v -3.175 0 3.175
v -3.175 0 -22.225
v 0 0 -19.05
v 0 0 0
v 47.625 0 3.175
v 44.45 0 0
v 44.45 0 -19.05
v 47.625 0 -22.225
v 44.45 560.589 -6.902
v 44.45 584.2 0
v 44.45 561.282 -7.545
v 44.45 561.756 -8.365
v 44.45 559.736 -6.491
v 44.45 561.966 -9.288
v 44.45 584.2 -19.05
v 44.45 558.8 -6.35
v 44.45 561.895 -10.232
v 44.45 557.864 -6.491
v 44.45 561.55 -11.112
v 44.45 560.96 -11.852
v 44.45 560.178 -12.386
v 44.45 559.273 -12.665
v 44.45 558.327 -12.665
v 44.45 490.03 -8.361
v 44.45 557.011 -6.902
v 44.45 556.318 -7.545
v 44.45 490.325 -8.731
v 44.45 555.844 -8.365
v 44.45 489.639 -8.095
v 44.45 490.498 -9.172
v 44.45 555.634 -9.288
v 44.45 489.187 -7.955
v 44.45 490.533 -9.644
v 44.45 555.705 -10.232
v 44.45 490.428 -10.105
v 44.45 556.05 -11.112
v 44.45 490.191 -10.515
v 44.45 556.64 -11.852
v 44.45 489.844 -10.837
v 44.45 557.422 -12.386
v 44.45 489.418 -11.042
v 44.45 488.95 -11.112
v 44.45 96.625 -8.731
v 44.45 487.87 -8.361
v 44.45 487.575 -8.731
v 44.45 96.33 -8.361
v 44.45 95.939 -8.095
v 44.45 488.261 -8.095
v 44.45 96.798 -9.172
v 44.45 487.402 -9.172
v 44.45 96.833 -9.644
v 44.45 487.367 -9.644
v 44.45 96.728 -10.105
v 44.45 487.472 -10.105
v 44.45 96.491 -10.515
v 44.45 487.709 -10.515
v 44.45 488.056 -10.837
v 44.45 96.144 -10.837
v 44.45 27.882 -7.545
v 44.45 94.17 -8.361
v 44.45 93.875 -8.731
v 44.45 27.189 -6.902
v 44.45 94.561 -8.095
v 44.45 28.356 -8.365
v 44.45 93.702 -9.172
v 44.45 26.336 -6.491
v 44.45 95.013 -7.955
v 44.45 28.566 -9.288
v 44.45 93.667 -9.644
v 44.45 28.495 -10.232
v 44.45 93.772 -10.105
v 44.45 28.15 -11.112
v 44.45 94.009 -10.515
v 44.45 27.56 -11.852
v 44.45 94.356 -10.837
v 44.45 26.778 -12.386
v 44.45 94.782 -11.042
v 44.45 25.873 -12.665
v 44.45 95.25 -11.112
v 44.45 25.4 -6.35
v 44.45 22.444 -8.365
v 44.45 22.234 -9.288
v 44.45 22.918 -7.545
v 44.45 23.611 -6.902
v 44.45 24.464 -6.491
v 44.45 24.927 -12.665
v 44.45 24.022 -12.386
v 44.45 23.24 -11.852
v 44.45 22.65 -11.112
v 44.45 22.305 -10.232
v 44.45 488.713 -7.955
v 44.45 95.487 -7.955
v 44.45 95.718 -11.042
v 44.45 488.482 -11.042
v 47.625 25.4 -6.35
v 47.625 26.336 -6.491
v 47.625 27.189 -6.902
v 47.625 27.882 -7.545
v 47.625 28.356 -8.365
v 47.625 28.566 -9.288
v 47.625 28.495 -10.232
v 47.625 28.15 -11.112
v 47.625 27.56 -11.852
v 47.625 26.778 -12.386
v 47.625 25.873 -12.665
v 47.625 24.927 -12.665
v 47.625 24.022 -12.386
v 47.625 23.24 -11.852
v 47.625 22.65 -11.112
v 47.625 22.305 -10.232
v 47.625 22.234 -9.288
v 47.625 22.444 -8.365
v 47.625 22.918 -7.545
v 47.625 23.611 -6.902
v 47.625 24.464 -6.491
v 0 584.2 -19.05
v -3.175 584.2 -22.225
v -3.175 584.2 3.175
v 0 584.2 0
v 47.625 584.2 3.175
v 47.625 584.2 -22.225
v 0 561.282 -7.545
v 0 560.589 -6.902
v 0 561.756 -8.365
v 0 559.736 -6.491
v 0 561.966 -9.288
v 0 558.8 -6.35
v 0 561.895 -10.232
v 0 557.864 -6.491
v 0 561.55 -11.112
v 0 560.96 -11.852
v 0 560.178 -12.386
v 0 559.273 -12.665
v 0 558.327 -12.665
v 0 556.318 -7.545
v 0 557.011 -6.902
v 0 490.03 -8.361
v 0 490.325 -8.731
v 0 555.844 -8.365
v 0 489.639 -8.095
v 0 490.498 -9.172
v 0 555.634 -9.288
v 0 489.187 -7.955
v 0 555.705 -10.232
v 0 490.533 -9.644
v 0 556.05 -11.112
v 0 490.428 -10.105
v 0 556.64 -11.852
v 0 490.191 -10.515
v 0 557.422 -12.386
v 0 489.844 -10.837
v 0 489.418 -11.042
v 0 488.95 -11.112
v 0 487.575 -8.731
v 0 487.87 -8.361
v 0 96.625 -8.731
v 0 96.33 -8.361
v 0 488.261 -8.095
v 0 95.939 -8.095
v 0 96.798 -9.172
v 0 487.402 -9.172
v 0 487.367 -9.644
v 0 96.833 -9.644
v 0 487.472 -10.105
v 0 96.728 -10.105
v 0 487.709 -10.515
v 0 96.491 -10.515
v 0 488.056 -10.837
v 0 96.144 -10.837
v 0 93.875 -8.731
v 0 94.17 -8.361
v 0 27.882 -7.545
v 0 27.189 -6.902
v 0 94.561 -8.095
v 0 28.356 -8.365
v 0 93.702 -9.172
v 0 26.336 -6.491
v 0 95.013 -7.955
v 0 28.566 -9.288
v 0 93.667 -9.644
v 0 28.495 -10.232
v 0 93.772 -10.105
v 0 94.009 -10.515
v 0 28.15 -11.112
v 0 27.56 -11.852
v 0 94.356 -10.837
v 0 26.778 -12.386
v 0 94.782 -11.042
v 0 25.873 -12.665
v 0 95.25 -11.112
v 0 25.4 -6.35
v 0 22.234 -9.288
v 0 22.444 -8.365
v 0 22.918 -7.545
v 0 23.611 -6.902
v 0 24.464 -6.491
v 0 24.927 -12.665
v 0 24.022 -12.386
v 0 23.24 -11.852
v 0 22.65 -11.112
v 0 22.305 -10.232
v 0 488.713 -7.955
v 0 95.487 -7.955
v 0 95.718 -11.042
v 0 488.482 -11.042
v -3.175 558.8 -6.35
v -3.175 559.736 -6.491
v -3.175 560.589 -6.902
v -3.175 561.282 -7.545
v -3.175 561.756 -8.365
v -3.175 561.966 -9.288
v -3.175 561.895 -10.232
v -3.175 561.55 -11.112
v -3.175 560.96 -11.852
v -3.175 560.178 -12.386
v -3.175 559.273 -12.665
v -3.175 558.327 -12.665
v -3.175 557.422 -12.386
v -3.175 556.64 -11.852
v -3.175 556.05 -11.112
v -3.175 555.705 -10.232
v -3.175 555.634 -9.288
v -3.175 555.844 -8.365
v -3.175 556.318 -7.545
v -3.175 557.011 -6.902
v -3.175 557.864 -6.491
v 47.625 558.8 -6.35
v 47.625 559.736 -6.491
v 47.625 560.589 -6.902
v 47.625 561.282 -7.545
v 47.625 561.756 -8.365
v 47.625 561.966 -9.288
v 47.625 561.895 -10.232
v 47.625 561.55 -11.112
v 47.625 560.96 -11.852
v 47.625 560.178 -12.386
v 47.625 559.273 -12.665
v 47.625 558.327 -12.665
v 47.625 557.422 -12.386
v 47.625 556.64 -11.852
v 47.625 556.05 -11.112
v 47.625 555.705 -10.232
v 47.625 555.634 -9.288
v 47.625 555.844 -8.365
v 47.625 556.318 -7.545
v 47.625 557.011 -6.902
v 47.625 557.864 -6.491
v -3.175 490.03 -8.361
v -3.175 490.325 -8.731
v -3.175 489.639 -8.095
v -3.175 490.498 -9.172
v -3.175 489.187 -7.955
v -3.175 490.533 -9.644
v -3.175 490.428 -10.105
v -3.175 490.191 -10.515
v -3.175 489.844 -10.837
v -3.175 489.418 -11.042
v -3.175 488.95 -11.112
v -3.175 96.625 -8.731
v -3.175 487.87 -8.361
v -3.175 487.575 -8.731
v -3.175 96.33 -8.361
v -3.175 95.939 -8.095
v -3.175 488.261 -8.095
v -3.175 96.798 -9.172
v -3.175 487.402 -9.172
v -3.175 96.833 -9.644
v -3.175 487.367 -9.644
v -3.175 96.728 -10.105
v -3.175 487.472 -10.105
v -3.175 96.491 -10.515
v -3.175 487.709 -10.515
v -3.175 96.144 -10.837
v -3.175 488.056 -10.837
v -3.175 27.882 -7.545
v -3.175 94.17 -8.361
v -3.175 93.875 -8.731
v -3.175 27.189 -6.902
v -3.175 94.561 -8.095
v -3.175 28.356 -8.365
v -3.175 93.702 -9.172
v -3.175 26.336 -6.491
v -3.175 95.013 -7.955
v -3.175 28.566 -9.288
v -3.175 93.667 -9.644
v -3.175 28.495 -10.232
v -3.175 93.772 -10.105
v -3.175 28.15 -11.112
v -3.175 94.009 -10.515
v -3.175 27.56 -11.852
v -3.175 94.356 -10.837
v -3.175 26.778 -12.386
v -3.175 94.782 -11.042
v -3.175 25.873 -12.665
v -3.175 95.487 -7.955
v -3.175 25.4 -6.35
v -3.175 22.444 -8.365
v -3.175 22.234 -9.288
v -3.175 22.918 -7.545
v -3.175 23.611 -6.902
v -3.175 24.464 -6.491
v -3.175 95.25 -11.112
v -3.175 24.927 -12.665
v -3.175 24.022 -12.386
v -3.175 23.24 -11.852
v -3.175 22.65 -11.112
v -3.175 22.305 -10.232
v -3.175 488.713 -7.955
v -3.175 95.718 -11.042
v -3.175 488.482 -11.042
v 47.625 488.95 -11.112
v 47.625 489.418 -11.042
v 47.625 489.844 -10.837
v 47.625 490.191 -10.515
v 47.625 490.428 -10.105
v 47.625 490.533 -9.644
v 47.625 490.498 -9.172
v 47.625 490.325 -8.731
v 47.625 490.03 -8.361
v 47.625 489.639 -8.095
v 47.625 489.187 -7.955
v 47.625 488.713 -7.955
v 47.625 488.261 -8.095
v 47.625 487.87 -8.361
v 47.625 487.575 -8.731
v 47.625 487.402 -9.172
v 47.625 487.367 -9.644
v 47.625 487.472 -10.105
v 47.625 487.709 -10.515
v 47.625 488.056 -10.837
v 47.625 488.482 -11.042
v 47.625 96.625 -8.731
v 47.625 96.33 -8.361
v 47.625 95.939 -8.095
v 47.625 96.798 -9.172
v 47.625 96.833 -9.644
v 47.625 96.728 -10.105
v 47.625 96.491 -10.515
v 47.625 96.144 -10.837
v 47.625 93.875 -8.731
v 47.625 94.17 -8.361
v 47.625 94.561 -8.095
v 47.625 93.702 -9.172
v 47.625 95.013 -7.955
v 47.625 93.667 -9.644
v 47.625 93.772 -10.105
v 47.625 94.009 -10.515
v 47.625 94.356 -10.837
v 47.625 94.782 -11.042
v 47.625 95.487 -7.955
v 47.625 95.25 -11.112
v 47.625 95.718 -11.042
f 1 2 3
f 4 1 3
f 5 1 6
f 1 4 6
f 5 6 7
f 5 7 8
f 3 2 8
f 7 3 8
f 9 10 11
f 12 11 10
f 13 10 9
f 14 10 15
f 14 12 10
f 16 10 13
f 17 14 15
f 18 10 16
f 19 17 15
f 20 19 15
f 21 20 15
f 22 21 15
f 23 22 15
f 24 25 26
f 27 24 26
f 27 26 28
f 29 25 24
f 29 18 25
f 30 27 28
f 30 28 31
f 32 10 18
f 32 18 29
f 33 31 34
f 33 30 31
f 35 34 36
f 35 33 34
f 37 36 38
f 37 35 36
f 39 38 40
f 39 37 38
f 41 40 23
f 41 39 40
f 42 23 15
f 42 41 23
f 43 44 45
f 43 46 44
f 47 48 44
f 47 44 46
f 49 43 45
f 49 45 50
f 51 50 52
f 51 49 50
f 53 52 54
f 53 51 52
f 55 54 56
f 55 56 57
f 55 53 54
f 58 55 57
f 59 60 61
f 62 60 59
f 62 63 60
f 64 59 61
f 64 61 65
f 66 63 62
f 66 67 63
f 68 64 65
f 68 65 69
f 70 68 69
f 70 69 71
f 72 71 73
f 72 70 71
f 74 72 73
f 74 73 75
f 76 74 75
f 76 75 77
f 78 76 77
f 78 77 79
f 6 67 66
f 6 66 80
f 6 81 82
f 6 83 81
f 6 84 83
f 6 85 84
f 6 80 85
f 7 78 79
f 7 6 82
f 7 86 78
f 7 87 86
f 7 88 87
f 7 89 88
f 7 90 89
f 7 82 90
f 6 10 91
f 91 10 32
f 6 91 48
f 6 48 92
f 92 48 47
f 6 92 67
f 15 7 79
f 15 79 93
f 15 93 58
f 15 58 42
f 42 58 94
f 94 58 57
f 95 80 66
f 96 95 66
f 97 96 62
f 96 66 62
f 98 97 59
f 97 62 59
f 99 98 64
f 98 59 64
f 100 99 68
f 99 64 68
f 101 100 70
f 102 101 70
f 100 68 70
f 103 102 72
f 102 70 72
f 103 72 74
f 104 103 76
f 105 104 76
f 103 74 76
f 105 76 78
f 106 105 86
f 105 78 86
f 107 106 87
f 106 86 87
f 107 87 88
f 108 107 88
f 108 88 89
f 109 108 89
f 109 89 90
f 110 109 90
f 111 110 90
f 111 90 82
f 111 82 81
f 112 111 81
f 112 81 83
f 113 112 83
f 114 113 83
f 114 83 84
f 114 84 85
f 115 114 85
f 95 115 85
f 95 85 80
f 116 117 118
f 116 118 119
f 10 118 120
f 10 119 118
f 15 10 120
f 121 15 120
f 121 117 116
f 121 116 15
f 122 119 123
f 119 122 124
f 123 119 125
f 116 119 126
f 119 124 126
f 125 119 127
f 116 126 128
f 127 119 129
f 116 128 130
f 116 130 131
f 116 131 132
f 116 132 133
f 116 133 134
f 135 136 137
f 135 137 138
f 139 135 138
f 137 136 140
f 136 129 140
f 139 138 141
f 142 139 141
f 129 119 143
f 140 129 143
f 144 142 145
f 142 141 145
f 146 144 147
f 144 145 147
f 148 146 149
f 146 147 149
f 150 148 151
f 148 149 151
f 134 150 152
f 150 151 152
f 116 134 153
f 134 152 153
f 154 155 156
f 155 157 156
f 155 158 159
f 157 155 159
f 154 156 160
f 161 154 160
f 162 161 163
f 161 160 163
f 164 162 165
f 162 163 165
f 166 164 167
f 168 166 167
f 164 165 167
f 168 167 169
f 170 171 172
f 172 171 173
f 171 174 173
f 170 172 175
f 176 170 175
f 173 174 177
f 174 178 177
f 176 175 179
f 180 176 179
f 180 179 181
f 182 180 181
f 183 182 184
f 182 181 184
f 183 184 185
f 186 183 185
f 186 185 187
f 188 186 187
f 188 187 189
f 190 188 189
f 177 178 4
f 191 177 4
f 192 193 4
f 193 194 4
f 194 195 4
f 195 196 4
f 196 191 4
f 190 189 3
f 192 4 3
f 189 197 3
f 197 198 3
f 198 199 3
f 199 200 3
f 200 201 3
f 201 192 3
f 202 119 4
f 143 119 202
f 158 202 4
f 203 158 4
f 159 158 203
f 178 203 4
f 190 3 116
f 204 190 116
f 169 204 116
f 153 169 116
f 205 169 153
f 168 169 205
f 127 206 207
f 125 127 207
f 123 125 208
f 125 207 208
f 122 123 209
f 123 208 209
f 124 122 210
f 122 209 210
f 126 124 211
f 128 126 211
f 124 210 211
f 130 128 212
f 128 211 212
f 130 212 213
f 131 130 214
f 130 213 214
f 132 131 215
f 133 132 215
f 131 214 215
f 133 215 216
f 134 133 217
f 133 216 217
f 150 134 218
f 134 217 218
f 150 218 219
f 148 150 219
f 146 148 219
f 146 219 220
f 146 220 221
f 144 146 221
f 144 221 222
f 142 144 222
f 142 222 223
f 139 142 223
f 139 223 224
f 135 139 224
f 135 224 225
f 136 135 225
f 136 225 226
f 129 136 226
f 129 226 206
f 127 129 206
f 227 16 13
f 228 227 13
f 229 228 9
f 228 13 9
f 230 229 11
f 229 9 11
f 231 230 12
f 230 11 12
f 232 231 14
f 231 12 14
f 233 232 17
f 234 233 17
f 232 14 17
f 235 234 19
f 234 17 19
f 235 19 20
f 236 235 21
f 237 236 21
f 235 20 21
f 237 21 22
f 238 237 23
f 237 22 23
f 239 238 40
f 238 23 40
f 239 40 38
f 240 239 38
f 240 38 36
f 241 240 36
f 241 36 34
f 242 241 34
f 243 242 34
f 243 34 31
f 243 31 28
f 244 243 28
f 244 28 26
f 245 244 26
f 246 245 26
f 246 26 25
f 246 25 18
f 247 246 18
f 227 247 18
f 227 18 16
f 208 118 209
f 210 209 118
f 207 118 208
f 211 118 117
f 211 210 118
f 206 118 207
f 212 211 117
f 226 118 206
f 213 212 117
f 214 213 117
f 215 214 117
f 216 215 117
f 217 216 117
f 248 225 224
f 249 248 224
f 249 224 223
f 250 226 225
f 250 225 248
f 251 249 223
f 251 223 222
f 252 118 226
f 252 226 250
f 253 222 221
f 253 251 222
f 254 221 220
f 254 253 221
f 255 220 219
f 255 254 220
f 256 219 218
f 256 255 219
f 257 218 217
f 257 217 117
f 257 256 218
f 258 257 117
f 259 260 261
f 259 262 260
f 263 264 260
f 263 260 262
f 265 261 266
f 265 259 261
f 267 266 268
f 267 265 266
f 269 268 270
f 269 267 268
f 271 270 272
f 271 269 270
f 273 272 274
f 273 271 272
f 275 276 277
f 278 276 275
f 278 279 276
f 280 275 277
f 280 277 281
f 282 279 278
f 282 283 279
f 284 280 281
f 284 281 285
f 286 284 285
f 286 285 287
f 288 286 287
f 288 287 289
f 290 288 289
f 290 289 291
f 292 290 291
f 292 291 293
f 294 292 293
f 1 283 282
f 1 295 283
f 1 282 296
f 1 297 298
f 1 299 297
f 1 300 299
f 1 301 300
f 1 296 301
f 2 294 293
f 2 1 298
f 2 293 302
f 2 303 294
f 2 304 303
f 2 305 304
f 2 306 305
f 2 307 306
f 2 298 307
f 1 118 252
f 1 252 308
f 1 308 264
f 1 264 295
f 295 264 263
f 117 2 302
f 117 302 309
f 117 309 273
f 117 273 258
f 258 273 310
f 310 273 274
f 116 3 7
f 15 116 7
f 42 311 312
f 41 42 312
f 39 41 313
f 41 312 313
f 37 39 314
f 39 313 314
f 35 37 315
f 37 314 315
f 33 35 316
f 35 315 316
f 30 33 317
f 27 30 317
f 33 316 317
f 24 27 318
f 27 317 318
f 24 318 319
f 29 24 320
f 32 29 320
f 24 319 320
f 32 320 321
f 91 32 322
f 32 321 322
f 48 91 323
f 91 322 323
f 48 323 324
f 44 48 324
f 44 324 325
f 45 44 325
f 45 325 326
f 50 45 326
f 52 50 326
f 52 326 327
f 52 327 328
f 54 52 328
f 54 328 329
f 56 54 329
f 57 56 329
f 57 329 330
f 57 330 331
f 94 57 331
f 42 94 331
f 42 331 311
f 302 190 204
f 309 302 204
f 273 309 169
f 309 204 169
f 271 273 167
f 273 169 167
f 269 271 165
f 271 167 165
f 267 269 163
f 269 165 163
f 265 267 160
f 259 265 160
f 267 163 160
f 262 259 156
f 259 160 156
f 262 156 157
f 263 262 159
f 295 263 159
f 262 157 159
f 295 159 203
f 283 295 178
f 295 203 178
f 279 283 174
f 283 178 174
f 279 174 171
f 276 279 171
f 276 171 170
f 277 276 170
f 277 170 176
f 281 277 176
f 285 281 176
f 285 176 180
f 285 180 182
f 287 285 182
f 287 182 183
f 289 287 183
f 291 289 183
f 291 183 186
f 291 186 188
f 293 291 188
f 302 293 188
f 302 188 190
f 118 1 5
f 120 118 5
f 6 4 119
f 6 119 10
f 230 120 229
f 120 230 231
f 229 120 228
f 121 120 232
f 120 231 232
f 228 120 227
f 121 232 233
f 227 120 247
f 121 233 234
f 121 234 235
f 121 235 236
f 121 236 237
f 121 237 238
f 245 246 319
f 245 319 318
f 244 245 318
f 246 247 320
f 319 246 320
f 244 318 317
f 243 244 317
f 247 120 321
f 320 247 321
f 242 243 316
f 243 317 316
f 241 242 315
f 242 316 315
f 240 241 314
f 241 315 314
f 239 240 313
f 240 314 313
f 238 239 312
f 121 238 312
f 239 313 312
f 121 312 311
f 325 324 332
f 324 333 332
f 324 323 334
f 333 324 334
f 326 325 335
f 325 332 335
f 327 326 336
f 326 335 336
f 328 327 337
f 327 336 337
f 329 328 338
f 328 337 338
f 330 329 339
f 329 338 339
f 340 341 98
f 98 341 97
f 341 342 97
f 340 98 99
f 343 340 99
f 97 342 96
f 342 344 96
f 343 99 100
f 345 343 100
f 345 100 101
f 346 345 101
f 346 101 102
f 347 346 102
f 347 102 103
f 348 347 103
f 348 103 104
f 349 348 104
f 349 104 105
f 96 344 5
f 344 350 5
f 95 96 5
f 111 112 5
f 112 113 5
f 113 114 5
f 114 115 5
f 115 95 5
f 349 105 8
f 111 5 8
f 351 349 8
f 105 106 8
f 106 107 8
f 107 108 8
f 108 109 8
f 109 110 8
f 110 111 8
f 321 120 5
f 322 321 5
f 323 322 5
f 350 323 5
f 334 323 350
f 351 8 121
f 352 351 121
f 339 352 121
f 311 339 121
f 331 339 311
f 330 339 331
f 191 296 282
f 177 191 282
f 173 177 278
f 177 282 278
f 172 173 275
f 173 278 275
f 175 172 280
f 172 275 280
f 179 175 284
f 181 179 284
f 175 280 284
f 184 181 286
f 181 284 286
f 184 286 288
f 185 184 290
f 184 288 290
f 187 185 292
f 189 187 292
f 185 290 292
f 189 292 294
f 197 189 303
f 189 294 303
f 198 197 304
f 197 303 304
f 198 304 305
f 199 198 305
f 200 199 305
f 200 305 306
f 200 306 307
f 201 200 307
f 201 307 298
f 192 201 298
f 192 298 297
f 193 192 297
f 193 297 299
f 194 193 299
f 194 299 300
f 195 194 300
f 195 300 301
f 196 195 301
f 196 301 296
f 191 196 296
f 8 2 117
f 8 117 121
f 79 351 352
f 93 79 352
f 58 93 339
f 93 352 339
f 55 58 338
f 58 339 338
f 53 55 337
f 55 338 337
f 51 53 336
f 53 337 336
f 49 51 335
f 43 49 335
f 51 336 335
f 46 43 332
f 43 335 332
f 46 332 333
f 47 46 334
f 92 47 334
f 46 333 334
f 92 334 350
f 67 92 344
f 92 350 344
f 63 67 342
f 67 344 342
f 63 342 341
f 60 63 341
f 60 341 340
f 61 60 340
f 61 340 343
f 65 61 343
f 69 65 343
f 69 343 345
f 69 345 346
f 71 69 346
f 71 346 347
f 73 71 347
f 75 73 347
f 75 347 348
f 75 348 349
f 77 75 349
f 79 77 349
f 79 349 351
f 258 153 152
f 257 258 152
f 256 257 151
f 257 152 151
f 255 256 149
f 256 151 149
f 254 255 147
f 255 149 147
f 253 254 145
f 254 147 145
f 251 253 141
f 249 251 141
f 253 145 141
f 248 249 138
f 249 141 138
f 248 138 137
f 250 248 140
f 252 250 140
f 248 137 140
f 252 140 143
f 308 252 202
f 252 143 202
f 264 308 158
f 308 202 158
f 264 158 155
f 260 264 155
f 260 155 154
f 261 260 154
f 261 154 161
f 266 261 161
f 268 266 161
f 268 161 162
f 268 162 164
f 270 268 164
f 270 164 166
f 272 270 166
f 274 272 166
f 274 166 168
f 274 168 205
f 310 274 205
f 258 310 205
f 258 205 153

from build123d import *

# Parameters (mm, degrees)
SKETCH1_W           = 50.8
SKETCH1_H           = 25.4
SKETCH1_W_2         = 44.45
SKETCH1_H_2         = 19.05
BOSS_EXTRUDE1_DEPTH = 584.2
SKETCH2_R           = 1.5875
CUT_EXTRUDE1_DEPTH  = 587.825553828
SKETCH3_R           = 3.175
CUT_EXTRUDE2_DEPTH  = 587.825553828


with BuildPart() as part:
    # Sketch1 → Boss-Extrude1 (new body)
    with BuildSketch(Plane(origin=(0, 0, 0), x_dir=(1, 0, 0), z_dir=(0, 1, 0))):
        with Locations((22.225, 9.525)):
            Rectangle(SKETCH1_W, SKETCH1_H)
        with Locations((22.225, 9.525)):
            Rectangle(SKETCH1_W_2, SKETCH1_H_2, mode=Mode.SUBTRACT)
    extrude(amount=BOSS_EXTRUDE1_DEPTH)

    # Sketch2 → Cut-Extrude1 (cut, through all)
    with BuildSketch(Plane(origin=(47.625, 0, 0), x_dir=(0, 0, -1), z_dir=(1, 0, 0))):
        with Locations((9.525, 95.25)):
            Circle(SKETCH2_R)
        with Locations((9.525, 488.95)):
            Circle(SKETCH2_R)
    extrude(amount=-CUT_EXTRUDE1_DEPTH, mode=Mode.SUBTRACT)

    # Sketch3 → Cut-Extrude2 (cut, through all)
    with BuildSketch(Plane.ZY.offset(3.175)):
        with Locations((-9.525, 25.4)):
            Circle(SKETCH3_R)
        with Locations((-9.525, 558.8)):
            Circle(SKETCH3_R)
    extrude(amount=-CUT_EXTRUDE2_DEPTH, mode=Mode.SUBTRACT)


solid = part.part
